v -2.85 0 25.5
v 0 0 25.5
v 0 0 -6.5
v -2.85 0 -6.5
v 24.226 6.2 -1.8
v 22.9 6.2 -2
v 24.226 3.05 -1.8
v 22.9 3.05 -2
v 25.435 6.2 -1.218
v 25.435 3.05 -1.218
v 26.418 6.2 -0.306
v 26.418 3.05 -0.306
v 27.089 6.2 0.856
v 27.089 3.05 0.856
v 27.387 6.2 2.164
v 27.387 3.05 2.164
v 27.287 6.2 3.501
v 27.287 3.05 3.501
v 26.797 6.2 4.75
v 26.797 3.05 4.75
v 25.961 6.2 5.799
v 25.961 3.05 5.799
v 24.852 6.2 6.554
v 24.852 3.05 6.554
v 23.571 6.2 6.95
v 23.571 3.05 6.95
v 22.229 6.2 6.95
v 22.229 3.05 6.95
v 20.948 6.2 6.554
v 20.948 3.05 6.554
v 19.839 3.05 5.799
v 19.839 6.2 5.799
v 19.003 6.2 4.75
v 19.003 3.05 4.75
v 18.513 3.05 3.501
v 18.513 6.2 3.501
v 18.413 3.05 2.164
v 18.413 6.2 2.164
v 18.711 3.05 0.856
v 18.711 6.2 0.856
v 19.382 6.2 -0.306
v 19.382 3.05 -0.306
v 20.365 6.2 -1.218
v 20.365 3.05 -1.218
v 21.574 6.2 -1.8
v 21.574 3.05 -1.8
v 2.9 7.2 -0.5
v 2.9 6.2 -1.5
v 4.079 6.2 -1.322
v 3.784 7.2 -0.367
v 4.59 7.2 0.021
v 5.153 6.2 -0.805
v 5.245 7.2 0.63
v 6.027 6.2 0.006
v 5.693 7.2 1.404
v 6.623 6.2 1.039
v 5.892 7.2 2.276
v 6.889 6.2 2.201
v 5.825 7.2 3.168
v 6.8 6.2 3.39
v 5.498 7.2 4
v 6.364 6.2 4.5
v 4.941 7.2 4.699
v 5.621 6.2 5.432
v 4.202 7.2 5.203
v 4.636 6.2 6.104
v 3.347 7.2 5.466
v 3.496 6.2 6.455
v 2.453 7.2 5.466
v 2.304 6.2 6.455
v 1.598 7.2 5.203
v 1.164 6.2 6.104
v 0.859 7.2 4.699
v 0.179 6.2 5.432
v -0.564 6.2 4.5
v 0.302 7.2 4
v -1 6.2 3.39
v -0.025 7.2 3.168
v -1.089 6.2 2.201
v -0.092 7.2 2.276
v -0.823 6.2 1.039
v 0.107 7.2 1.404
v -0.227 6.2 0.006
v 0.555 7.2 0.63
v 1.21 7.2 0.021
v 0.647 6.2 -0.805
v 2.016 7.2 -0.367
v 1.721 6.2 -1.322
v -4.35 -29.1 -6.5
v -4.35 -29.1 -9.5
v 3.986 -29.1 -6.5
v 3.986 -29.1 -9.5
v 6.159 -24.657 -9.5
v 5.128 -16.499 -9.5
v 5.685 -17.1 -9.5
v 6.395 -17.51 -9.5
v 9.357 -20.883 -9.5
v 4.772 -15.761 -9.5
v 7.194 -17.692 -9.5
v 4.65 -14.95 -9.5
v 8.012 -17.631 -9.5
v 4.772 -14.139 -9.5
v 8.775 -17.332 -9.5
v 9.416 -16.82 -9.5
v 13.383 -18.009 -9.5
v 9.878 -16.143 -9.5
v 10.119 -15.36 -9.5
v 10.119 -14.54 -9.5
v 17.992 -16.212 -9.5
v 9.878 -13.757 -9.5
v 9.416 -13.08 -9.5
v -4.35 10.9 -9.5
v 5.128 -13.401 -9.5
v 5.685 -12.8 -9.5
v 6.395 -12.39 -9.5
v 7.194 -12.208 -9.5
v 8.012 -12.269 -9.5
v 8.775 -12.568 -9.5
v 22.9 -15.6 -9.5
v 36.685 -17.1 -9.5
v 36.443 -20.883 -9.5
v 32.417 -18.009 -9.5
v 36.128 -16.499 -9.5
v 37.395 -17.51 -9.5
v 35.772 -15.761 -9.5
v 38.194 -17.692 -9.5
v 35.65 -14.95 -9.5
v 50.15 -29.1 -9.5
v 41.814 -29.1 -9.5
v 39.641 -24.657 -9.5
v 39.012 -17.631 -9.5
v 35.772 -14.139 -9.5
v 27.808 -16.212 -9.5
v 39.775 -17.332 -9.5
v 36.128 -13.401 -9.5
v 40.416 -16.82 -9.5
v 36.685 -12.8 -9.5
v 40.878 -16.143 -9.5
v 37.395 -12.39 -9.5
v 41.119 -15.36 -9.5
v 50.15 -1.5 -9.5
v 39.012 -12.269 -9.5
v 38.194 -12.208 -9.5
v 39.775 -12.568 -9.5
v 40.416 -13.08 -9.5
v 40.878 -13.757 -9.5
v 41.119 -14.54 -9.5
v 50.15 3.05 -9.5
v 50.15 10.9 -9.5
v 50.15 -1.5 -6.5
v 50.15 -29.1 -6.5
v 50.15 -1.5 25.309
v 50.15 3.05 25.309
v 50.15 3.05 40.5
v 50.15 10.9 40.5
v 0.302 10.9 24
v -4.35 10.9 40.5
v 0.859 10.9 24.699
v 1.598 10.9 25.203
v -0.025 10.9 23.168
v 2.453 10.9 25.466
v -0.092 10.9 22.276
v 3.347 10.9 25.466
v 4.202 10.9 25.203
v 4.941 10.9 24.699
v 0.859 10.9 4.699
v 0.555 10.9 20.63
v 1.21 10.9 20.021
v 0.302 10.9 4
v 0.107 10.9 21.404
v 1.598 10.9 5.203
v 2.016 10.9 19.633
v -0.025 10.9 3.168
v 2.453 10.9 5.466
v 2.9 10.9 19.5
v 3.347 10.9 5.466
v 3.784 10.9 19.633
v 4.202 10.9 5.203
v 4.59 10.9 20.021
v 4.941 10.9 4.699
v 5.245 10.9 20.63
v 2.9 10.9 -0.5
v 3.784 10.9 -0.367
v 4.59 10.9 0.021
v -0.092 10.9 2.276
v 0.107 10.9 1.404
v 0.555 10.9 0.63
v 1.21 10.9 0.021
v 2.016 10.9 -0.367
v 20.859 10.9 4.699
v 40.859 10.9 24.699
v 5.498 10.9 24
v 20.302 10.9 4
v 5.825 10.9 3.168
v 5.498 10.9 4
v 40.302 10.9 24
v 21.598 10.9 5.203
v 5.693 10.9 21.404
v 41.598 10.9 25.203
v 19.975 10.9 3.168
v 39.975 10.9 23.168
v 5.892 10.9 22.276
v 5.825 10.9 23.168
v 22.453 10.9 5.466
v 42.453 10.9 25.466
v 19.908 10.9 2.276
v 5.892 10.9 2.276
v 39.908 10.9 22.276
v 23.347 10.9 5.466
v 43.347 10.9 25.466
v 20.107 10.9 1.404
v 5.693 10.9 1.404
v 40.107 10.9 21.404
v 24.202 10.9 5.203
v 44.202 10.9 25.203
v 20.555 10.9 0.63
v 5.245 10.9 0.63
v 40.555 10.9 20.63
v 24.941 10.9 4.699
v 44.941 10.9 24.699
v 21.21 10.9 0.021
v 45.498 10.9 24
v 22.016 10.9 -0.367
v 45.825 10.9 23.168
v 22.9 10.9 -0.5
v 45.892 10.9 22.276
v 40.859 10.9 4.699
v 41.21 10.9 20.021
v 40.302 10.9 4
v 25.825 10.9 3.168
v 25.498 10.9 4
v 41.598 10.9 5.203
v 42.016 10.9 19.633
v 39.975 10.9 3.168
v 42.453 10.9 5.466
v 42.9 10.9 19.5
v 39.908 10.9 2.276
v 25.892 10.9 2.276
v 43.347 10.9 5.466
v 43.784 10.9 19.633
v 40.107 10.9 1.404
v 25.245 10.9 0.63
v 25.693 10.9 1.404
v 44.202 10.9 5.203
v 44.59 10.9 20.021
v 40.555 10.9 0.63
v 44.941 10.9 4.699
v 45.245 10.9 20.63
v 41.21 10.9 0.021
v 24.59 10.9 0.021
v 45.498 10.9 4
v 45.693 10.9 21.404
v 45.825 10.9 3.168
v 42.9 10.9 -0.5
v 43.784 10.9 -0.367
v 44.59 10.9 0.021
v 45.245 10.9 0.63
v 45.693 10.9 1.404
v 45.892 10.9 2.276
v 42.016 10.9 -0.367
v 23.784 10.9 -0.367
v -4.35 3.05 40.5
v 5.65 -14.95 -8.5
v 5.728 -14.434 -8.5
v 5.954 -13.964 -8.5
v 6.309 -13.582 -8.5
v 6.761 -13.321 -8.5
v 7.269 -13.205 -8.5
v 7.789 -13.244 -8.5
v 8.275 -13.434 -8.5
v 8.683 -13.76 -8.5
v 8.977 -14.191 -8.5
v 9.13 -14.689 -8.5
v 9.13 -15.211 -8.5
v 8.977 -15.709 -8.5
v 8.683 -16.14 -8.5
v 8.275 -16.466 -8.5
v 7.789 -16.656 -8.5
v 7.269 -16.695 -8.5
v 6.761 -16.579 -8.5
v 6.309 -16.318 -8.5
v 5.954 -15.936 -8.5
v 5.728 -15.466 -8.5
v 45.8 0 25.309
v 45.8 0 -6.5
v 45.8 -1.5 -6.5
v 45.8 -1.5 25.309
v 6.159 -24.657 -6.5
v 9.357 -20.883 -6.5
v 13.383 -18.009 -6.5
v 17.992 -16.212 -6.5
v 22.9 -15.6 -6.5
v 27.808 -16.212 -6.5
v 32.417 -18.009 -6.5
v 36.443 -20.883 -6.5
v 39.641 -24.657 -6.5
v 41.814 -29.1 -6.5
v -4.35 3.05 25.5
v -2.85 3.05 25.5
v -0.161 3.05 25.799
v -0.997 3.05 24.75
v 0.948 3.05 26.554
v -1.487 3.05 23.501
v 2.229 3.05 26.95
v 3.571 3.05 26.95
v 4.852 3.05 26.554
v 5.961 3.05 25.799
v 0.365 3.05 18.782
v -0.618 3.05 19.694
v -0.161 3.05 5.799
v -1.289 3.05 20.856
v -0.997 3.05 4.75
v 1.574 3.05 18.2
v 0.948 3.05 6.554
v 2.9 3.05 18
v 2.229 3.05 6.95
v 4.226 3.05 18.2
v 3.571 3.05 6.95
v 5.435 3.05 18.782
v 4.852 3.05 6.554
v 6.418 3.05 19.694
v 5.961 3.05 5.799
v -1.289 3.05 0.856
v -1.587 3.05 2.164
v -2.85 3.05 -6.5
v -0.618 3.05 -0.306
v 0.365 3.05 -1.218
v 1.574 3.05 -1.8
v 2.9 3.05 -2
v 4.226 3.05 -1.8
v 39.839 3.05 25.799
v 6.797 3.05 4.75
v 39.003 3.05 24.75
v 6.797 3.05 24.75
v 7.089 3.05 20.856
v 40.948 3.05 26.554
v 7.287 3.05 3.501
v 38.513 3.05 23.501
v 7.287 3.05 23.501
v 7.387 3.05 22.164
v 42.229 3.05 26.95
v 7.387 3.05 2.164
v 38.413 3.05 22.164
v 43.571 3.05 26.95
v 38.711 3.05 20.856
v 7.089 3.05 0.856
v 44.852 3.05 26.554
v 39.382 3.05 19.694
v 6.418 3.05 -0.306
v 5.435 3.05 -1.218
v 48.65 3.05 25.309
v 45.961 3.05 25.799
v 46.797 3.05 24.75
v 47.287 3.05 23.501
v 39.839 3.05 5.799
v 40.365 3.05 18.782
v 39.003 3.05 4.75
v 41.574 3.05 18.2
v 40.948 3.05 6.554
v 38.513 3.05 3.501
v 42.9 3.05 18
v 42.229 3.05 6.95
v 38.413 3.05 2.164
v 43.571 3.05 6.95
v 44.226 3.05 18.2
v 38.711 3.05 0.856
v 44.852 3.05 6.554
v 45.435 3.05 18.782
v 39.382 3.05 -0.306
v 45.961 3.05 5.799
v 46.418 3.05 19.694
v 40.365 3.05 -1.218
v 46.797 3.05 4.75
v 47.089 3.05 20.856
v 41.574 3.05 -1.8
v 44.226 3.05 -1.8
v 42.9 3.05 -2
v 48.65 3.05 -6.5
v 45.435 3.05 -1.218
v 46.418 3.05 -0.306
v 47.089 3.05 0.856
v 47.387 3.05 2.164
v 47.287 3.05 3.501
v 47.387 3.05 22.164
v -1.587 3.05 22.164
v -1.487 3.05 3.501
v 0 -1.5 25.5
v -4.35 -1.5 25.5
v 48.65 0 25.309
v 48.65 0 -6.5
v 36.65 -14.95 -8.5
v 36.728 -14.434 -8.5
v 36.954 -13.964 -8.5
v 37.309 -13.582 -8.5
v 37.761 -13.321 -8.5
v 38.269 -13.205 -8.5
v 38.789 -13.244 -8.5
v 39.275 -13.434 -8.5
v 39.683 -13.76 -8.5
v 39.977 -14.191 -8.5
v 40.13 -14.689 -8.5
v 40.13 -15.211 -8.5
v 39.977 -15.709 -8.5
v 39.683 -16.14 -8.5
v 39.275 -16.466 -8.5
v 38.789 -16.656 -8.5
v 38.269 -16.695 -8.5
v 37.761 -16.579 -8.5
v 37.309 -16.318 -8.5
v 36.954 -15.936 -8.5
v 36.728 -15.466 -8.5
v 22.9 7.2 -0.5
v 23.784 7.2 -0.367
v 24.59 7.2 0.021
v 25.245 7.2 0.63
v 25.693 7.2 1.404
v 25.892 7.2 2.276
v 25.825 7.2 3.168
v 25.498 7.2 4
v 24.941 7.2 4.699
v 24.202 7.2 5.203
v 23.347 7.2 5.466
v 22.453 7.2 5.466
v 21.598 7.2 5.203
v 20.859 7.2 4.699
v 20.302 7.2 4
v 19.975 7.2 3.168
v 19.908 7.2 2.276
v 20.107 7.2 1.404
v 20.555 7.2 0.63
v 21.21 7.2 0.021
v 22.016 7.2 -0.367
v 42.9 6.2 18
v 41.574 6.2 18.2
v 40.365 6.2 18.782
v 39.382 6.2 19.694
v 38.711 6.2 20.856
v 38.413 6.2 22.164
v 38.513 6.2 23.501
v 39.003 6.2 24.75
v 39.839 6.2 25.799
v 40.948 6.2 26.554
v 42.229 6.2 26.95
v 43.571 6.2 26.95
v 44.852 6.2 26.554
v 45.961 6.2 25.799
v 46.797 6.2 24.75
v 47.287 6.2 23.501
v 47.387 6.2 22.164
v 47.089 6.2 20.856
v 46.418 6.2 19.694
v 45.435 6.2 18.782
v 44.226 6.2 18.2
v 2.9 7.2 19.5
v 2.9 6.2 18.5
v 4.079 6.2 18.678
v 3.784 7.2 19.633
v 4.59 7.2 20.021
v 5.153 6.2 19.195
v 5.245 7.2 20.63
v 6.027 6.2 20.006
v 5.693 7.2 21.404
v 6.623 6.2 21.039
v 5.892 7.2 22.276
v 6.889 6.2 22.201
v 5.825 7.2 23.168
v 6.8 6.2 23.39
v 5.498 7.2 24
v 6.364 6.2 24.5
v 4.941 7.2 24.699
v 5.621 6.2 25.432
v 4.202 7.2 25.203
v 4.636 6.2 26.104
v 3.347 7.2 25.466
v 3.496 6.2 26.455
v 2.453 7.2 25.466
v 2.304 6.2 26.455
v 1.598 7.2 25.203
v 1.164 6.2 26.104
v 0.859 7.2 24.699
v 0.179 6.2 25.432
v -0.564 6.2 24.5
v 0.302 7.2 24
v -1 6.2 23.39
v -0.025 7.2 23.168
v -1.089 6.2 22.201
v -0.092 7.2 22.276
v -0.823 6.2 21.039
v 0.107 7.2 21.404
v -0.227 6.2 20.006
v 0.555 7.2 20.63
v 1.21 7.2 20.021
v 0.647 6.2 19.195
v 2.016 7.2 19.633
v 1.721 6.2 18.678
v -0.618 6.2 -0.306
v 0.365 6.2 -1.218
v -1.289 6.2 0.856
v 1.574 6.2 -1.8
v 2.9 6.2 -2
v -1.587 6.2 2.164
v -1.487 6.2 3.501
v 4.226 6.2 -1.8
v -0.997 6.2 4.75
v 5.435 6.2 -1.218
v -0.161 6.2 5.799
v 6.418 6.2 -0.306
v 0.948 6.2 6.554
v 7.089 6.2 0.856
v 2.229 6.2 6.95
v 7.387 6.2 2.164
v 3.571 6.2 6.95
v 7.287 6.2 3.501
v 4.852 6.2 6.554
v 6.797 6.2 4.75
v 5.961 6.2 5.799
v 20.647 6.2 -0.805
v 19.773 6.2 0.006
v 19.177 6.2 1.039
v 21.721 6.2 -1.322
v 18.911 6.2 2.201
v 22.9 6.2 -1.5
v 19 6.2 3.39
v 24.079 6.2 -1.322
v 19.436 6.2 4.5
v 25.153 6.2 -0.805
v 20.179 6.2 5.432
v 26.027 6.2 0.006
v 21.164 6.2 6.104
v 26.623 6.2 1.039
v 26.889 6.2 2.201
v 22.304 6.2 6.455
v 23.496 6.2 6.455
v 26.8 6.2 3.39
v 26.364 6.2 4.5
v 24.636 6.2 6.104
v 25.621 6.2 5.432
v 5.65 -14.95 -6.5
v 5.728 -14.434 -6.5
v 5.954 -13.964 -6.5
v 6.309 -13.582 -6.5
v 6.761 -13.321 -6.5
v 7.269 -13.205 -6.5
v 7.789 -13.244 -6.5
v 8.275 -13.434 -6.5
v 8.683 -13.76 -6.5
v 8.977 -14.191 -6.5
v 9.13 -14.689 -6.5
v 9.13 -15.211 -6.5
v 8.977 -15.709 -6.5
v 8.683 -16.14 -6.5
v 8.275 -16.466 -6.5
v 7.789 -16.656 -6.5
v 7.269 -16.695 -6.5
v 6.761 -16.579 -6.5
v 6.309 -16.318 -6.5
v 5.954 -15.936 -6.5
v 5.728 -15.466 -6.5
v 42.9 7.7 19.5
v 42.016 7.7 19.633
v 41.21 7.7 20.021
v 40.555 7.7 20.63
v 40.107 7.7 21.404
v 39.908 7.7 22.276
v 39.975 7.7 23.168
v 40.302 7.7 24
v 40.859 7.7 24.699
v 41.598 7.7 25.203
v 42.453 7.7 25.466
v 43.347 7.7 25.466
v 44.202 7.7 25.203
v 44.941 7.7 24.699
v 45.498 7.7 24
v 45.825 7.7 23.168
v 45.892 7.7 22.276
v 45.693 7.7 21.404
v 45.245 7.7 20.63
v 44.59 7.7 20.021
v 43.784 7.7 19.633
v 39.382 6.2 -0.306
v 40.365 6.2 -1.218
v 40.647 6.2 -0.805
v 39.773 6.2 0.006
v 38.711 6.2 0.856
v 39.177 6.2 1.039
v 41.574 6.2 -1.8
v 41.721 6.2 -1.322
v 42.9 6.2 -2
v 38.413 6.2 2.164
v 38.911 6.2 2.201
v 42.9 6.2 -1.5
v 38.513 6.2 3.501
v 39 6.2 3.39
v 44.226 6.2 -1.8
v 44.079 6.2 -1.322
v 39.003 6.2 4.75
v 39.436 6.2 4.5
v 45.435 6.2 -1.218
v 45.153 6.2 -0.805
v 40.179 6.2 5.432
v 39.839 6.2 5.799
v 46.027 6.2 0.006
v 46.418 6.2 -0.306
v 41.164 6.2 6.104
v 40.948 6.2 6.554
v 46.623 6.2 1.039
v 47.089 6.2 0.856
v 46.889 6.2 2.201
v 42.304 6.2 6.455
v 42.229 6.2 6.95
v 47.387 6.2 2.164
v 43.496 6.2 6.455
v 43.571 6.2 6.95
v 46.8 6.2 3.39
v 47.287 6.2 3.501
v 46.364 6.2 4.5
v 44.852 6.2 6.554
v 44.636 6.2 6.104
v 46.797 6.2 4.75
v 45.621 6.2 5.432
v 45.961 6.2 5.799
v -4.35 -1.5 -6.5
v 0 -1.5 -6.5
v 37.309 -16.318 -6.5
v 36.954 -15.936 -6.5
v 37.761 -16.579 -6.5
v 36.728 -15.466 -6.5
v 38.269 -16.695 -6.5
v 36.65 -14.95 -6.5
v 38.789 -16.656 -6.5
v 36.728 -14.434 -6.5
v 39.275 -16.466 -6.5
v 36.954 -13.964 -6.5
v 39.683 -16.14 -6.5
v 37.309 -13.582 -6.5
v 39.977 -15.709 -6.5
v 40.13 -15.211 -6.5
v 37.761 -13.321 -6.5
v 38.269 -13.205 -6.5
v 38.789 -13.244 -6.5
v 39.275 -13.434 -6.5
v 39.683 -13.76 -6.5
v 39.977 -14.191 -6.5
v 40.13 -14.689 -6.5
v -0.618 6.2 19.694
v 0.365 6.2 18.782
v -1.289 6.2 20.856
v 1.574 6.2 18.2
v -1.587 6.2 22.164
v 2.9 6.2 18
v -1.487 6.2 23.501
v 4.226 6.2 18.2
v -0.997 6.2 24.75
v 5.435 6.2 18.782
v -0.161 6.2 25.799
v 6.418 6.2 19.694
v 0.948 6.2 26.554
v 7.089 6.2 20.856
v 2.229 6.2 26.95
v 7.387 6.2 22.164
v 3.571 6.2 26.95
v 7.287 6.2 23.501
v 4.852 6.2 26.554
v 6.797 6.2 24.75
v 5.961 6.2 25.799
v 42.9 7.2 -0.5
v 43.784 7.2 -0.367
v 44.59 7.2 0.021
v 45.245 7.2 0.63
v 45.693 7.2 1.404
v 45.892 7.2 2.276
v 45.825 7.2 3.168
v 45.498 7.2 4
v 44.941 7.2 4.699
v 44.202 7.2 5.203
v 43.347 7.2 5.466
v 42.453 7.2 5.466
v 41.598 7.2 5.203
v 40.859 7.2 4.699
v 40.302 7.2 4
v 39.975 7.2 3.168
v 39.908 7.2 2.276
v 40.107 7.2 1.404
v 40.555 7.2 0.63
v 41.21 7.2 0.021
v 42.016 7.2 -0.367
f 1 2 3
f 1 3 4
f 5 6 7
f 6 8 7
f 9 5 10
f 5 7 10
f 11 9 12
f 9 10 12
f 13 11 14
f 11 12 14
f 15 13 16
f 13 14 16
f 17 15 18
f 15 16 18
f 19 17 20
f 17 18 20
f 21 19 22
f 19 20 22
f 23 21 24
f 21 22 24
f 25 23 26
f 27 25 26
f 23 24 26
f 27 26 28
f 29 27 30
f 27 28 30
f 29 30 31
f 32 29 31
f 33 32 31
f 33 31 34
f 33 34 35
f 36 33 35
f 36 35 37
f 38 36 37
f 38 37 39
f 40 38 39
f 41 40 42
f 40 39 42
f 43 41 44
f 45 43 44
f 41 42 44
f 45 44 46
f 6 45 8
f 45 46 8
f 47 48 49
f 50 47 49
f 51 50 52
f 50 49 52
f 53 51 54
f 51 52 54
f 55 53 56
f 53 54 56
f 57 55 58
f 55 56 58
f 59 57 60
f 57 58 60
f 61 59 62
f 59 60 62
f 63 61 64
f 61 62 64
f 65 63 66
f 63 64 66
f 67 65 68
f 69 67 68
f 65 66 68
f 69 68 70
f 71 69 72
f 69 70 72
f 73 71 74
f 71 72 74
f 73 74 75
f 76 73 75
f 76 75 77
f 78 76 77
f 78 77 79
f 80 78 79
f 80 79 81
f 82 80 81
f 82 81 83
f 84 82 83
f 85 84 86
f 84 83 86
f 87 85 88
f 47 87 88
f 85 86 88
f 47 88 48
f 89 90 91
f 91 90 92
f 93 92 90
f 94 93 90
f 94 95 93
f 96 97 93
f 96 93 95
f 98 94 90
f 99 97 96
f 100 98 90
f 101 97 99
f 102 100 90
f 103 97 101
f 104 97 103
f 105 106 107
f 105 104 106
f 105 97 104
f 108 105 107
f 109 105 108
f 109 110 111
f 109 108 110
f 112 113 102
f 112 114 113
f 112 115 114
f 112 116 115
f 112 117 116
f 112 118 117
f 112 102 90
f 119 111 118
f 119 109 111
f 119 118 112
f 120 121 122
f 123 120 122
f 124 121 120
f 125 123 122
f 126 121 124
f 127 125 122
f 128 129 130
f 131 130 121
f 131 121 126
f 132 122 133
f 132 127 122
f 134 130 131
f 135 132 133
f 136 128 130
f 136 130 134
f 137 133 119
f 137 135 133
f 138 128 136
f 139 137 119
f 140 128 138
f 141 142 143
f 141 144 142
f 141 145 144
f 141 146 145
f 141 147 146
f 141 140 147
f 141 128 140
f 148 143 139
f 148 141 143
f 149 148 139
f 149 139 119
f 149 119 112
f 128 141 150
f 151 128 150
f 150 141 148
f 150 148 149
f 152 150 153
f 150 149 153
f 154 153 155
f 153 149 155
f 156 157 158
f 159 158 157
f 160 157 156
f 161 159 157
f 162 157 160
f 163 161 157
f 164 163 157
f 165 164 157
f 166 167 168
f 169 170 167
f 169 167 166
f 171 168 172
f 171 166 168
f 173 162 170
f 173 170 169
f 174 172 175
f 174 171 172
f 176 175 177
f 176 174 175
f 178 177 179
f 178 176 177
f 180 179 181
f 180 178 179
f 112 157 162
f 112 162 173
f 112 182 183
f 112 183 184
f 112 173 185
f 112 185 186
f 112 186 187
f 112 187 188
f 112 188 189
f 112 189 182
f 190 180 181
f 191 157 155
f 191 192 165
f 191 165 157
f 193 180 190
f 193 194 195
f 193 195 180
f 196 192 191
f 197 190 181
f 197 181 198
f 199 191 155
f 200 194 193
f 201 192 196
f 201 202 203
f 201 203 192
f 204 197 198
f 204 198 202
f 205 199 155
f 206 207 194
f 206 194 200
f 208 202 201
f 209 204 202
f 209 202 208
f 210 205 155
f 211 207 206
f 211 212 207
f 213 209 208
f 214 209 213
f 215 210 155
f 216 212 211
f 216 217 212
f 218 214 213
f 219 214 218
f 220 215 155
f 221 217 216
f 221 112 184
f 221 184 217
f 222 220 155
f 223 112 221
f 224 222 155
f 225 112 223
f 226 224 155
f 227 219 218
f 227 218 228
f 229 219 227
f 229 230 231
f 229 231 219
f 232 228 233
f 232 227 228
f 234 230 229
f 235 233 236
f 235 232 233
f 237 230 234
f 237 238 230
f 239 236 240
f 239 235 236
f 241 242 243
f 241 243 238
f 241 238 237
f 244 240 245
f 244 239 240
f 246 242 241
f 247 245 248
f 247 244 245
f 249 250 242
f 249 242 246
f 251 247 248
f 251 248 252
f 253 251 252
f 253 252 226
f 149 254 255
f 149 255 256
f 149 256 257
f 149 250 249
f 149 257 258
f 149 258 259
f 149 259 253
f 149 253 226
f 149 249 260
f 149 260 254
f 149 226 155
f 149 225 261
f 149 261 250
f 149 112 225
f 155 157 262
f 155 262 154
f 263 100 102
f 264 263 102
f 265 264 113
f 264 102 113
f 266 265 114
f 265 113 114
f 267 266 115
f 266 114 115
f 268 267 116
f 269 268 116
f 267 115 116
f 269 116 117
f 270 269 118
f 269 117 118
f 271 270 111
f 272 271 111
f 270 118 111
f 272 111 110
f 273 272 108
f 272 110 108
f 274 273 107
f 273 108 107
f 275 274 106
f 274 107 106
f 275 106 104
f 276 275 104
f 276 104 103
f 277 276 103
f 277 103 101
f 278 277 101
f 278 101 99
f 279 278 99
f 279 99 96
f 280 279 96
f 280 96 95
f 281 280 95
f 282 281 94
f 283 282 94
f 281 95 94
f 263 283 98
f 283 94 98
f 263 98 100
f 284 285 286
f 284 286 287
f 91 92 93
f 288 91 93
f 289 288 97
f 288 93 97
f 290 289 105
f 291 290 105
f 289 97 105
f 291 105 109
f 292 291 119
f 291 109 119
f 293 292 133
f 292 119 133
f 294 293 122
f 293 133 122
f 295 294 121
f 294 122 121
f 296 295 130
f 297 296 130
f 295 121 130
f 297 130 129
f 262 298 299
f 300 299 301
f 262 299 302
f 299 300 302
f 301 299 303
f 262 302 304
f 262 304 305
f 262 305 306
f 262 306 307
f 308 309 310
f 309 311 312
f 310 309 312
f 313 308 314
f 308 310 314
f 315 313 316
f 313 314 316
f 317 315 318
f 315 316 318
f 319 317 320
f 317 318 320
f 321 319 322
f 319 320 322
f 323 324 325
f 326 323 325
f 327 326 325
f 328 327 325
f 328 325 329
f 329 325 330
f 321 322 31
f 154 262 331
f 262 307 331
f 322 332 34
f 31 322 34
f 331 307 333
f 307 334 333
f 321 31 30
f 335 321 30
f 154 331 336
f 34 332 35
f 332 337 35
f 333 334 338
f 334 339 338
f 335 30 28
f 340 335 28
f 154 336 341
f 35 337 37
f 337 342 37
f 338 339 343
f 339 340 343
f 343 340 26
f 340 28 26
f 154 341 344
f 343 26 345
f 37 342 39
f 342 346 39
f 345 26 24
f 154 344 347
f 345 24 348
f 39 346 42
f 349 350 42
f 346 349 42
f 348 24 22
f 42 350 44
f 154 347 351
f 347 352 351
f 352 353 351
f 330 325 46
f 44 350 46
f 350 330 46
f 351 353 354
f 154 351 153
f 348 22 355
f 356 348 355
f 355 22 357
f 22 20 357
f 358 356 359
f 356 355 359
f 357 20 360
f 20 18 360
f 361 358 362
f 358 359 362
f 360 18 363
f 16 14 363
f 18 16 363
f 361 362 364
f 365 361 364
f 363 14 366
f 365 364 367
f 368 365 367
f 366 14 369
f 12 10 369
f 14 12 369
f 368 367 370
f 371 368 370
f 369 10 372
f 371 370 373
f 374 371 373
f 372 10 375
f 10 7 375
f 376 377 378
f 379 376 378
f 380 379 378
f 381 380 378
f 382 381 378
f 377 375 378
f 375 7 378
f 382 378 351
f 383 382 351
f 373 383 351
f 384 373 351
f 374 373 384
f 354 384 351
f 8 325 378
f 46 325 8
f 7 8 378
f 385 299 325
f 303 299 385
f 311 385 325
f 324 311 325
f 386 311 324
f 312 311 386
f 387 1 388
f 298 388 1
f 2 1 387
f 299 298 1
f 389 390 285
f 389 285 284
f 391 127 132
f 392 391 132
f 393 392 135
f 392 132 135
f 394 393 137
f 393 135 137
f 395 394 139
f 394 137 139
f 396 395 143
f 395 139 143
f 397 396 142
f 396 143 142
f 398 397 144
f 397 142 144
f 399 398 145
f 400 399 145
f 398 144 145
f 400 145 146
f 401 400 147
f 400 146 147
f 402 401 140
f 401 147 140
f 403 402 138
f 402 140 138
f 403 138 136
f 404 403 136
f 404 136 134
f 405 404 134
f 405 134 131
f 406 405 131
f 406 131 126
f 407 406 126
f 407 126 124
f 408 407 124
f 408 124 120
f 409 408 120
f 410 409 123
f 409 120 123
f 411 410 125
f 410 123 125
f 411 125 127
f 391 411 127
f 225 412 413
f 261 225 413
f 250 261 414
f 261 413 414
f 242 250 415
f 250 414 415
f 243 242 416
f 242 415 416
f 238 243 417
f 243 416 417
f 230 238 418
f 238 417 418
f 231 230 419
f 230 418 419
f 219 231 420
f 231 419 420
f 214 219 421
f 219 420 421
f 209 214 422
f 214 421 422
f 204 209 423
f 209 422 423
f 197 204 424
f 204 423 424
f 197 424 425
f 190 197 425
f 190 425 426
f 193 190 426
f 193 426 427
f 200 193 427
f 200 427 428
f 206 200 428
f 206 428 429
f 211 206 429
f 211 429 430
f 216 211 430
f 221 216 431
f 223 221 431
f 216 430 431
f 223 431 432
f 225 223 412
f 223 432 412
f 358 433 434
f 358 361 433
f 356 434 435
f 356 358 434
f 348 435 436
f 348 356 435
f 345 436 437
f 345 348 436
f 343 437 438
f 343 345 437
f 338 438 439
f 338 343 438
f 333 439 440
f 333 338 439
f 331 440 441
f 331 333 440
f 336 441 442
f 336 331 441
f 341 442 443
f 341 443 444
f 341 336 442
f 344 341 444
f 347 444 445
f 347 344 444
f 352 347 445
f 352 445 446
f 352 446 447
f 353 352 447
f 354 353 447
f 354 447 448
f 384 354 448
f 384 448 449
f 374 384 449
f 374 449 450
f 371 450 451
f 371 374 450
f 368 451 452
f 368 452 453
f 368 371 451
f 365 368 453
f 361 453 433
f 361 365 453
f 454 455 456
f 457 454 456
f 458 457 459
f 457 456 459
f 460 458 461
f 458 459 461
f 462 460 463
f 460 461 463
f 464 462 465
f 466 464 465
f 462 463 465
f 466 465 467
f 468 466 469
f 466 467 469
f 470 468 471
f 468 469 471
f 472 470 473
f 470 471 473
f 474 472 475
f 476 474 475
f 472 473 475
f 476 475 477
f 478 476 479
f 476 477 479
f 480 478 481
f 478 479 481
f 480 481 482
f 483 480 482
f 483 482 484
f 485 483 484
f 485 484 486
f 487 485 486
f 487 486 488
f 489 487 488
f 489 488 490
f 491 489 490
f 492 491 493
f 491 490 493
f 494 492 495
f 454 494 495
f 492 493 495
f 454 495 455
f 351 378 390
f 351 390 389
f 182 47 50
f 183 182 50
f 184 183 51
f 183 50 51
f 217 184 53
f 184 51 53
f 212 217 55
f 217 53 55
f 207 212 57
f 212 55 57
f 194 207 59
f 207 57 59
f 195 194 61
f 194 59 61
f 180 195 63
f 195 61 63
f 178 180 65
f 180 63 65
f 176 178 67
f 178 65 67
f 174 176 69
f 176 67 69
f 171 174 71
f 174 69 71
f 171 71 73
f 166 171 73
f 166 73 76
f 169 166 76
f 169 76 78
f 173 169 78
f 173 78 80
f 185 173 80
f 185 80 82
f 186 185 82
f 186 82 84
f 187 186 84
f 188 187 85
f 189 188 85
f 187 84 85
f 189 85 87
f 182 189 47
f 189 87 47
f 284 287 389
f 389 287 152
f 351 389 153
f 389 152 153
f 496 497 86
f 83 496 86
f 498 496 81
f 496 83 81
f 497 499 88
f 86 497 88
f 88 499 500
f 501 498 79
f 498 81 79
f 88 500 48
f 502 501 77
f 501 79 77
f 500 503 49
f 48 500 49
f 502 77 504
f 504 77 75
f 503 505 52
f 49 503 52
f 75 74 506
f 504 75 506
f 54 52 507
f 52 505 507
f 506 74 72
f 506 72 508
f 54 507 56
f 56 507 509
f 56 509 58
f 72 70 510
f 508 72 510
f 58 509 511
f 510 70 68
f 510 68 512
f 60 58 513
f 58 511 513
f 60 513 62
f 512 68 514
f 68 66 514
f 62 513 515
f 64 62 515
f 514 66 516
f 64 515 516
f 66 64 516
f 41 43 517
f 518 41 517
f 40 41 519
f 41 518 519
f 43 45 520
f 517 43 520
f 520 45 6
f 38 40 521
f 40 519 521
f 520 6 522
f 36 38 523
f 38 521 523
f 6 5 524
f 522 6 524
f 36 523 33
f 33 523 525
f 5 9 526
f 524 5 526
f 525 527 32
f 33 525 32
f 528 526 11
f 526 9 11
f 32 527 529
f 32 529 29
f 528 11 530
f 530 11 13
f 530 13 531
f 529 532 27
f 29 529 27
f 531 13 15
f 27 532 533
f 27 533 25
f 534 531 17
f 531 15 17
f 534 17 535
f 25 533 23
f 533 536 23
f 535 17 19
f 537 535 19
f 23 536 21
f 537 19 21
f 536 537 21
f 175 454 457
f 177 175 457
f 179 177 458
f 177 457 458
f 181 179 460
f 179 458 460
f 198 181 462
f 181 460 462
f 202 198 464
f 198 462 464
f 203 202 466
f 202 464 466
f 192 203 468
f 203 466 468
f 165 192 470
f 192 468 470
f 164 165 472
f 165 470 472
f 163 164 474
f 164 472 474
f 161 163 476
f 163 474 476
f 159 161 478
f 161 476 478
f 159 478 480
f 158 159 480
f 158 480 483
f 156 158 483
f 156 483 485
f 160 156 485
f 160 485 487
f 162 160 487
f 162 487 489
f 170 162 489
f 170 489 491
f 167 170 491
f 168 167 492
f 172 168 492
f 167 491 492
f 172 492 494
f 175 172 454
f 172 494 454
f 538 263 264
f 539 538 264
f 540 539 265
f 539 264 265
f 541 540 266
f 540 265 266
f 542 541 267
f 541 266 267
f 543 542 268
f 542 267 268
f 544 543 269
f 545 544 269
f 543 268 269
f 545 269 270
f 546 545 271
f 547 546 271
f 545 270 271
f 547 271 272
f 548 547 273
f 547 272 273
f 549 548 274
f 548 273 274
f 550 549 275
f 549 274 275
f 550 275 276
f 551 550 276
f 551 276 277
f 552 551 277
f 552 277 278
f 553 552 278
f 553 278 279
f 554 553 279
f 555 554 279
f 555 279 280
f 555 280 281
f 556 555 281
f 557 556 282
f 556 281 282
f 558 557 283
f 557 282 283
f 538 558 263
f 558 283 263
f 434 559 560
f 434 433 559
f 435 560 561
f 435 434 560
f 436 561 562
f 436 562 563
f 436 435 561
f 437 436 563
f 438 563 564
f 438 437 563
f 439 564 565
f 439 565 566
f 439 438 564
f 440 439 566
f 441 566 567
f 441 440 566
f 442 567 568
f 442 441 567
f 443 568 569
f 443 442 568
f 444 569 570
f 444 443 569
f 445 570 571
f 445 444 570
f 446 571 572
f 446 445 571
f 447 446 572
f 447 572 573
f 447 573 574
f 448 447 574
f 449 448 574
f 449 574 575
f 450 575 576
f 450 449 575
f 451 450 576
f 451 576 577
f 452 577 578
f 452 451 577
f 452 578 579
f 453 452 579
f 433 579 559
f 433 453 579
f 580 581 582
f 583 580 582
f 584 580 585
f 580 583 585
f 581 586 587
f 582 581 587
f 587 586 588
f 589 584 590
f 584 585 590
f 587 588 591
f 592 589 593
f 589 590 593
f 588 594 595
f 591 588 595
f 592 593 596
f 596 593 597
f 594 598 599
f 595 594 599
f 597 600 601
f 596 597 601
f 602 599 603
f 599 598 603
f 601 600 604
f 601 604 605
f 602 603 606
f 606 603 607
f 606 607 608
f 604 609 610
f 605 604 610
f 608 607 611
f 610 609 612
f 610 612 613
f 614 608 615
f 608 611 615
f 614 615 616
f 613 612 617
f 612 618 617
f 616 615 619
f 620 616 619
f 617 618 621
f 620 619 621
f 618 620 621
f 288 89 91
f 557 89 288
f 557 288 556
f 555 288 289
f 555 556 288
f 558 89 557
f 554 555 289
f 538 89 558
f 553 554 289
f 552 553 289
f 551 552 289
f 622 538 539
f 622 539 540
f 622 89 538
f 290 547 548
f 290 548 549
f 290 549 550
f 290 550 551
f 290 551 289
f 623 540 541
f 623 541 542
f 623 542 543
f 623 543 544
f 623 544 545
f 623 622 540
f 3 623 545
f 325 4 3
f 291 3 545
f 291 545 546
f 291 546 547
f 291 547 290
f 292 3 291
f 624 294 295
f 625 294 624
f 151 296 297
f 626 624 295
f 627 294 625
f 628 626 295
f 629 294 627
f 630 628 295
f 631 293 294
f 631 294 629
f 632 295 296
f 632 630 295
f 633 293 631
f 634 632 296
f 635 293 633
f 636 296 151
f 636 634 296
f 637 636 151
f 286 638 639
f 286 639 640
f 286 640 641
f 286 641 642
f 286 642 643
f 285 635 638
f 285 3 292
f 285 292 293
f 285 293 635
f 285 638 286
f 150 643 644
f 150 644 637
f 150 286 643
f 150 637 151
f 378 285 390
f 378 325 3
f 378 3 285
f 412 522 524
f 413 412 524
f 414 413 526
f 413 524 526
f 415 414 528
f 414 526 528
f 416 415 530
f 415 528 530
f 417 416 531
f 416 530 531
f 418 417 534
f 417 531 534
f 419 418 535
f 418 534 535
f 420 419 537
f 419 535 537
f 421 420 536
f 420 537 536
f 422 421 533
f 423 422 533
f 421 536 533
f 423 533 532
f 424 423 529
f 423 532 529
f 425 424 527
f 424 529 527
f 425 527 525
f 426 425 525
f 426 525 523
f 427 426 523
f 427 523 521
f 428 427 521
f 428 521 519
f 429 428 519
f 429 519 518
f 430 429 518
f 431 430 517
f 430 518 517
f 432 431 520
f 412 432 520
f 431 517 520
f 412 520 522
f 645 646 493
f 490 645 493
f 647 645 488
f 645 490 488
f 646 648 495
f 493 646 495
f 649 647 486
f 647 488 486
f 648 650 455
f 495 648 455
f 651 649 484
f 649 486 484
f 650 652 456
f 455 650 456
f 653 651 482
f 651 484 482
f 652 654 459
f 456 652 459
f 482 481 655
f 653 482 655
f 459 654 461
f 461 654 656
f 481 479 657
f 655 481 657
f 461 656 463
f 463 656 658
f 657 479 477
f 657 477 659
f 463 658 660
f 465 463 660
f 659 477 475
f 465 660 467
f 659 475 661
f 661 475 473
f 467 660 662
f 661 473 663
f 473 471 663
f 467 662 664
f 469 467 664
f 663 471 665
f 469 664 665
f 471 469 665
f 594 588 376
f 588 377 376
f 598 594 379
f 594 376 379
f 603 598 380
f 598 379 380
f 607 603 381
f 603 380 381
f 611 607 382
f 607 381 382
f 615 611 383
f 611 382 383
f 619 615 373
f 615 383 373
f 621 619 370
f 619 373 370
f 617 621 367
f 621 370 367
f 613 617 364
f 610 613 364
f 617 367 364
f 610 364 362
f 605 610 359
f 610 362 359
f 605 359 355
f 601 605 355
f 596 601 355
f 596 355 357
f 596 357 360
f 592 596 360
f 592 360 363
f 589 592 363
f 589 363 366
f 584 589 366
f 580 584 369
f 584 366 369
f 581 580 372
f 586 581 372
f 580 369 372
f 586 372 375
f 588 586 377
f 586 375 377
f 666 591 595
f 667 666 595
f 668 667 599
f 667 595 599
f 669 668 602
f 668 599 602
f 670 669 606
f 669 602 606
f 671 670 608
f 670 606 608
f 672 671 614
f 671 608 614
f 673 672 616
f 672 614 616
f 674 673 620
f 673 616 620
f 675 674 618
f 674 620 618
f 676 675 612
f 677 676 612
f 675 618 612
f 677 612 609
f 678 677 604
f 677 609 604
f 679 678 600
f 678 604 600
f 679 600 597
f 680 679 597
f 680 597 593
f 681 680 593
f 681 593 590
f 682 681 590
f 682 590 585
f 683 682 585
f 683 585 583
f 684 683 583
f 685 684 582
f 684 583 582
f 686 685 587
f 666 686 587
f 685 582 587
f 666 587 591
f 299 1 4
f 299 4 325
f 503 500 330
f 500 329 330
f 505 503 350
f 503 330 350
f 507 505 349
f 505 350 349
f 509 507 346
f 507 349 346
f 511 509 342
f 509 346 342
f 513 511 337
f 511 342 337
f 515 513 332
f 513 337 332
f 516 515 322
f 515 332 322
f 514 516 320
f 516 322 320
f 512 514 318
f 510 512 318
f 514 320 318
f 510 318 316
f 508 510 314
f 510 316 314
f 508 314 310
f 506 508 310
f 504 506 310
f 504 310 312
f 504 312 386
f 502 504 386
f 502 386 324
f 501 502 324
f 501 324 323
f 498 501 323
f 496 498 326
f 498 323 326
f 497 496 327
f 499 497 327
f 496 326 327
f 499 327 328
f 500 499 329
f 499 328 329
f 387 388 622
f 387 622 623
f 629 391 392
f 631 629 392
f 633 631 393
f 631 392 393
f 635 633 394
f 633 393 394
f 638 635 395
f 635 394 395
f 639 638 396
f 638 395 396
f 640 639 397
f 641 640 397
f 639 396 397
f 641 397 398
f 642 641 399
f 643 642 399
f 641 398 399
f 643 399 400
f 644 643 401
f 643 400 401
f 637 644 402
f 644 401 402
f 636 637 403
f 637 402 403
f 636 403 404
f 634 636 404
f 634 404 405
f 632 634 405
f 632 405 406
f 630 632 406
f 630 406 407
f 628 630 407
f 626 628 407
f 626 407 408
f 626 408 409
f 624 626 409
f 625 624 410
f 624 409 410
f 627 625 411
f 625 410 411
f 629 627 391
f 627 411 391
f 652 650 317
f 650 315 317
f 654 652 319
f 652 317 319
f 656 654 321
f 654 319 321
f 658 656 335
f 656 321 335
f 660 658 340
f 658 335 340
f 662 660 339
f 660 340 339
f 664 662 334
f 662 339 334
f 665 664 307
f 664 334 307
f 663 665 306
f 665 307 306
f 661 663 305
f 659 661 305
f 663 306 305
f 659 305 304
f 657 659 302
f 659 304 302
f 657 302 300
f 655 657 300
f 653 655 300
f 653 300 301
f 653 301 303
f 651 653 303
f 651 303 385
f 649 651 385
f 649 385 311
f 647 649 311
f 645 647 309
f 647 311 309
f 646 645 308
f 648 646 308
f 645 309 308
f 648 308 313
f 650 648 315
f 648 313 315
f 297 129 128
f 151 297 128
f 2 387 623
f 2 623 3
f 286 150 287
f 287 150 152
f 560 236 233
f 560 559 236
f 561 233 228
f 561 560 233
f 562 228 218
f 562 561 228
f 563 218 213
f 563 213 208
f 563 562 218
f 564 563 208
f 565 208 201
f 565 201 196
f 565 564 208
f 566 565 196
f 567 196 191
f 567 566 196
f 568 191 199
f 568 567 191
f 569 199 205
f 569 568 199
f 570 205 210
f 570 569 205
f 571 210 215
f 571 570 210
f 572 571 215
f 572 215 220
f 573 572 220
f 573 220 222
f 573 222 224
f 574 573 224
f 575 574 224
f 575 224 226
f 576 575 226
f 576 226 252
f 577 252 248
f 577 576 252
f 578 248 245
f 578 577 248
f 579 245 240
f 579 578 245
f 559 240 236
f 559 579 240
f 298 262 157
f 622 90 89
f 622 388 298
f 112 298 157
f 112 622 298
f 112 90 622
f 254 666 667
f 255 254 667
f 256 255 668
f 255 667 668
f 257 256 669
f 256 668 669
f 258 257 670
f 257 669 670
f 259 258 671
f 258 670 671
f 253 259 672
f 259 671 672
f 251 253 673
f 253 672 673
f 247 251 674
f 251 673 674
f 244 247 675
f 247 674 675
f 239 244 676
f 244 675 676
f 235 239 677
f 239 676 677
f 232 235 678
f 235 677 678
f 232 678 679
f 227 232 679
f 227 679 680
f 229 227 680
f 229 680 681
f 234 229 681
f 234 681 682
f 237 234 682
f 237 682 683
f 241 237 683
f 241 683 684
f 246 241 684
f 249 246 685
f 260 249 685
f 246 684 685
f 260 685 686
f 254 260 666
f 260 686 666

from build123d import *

# Parameters (mm, degrees)
CROQUIS1_W              = 54.5
CROQUIS1_H              = 35
SALIENTE_EXTRUIR1_DEPTH = 7.85
SALIENTE_EXTRUIR2_DEPTH = 35
CROQUIS3_W              = 54.5
CROQUIS3_H              = 7.85
SALIENTE_EXTRUIR3_DEPTH = 15
CROQUIS4_W              = 1.5
CROQUIS4_H              = 34.809371379
SALIENTE_EXTRUIR4_DEPTH = 4.55
CROQUIS5_W              = 34.809371379
CROQUIS5_H              = 1.5
SALIENTE_EXTRUIR5_DEPTH = 2.85
TALADRO1_AT_2_COUNT     = 2
TALADRO1_AT_2_PITCH     = 40
TALADRO1_AT_3_COUNT     = 2
TALADRO1_AT_3_PITCH     = 20
TALADRO1_AT_4_COUNT     = 2
TALADRO1_AT_4_PITCH     = 20
CHAFL_N1_SIZE           = 1
CROQUIS11_R             = 1.75
SALIENTE_EXTRUIR6_DEPTH = 3
CHAFL_N2_SIZE           = 1


with BuildPart() as part:
    # Croquis1 → Saliente-Extruir1 (new body)
    with BuildSketch(Plane.XZ.offset(-3.05)):
        with Locations((22.9, 8)):
            Rectangle(CROQUIS1_W, CROQUIS1_H)
    extrude(amount=-SALIENTE_EXTRUIR1_DEPTH)

    # Croquis2 → Saliente-Extruir2 (add)
    with BuildSketch(Plane.XY.offset(25.5)):
        Polygon((-4.35, 3.05), (-4.35, -1.5), (0, -1.5), (0, 0), (-2.85, 0), (-2.85, 3.05), align=None)
    extrude(amount=-SALIENTE_EXTRUIR2_DEPTH)

    # Croquis3 → Saliente-Extruir3 (add)
    with BuildSketch(Plane.XY.offset(25.5)):
        with Locations((22.9, 6.975)):
            Rectangle(CROQUIS3_W, CROQUIS3_H)
    extrude(amount=SALIENTE_EXTRUIR3_DEPTH)

    # Croquis4 → Saliente-Extruir4 (add)
    with BuildSketch(Plane.XZ.offset(-3.05)):
        with Locations((49.4, 7.90468569)):
            Rectangle(CROQUIS4_W, CROQUIS4_H)
    extrude(amount=SALIENTE_EXTRUIR4_DEPTH)

    # Croquis5 → Saliente-Extruir5 (add)
    with BuildSketch(Plane.ZY.offset(-48.65)):
        with Locations((7.90468569, -0.75)):
            Rectangle(CROQUIS5_W, CROQUIS5_H)
    extrude(amount=SALIENTE_EXTRUIR5_DEPTH)

    # Croquis7 → Taladro1 (revolve, cut)
    with BuildSketch(Plane(origin=(2.9, 3.05, 2.5), x_dir=(0, 0, -1), z_dir=(1, 0, 0))):
        Polygon((0, 0), (0, 7.85), (3, 7.85), (3, 3.15), (4.5, 3.15), (4.5, 0), align=None)
    taladro1 = revolve(axis=Axis((2.9, 113.05, 2.5), (0, -1, 0)), mode=Mode.SUBTRACT)

    # Taladro1 at 2: Taladro1 ×2
    with Locations(*[(i * TALADRO1_AT_2_PITCH, 0, 0) for i in range(1, TALADRO1_AT_2_COUNT)]):
        add(taladro1, mode=Mode.SUBTRACT)

    # Taladro1 at 3: Taladro1 ×2
    with Locations(*[(i * TALADRO1_AT_3_PITCH, 0, 0) for i in range(1, TALADRO1_AT_3_COUNT)]):
        add(taladro1, mode=Mode.SUBTRACT)

    # Taladro1 at 4: Taladro1 ×2
    with Locations(*[(0, 0, i * TALADRO1_AT_4_PITCH) for i in range(1, TALADRO1_AT_4_COUNT)]):
        add(taladro1, mode=Mode.SUBTRACT)

    # Croquis9 → Taladro2 (revolve, cut)
    with BuildSketch(Plane(origin=(42.9, 3.05, 22.5), x_dir=(0, 0, -1), z_dir=(1, 0, 0))):
        Polygon((0, 0), (0, 7.85), (3, 7.85), (3, 4.65), (4.5, 3.15), (4.5, 0), align=None)
    revolve(axis=Axis((42.9, -3.080023899, 22.5), (0, 1, 0)), mode=Mode.SUBTRACT)

    # Chaflán1
    chafl_n1_edges = [part.edges().sort_by_distance(p)[0] for p in [
        (2.9, 6.2, 25.5),
        (22.9, 6.2, 5.5),
        (42.9, 6.2, 5.5),
        (2.9, 6.2, 5.5),
    ]]
    chamfer(chafl_n1_edges, length=CHAFL_N1_SIZE)

    # Croquis11 → Saliente-Extruir6 (add)
    with BuildSketch(Plane(origin=(0, 0, -9.5), x_dir=(-1, 0, 0), z_dir=(0, 0, -1))):
        with BuildLine():
            Line((-50.15, 10.9), (4.35, 10.9))
            Line((4.35, 10.9), (4.35, -29.1))
            Line((4.35, -29.1), (-3.985719681, -29.1))
            ThreePointArc((-3.985719681, -29.1), (-22.9, -15.6), (-41.814280319, -29.1))
            Line((-41.814280319, -29.1), (-50.15, -29.1))
            Line((-50.15, -29.1), (-50.15, 10.9))
        make_face()
        with Locations((-38.4, -14.95)):
            Circle(CROQUIS11_R, mode=Mode.SUBTRACT)
        with Locations((-7.4, -14.95)):
            Circle(CROQUIS11_R, mode=Mode.SUBTRACT)
    extrude(amount=-SALIENTE_EXTRUIR6_DEPTH)

    # Chaflán2
    chafl_n2_edges = [part.edges().sort_by_distance(p)[0] for p in [
        (40.15, -14.95, -9.5),
        (9.15, -14.95, -9.5),
    ]]
    chamfer(chafl_n2_edges, length=CHAFL_N2_SIZE)


solid = part.part
